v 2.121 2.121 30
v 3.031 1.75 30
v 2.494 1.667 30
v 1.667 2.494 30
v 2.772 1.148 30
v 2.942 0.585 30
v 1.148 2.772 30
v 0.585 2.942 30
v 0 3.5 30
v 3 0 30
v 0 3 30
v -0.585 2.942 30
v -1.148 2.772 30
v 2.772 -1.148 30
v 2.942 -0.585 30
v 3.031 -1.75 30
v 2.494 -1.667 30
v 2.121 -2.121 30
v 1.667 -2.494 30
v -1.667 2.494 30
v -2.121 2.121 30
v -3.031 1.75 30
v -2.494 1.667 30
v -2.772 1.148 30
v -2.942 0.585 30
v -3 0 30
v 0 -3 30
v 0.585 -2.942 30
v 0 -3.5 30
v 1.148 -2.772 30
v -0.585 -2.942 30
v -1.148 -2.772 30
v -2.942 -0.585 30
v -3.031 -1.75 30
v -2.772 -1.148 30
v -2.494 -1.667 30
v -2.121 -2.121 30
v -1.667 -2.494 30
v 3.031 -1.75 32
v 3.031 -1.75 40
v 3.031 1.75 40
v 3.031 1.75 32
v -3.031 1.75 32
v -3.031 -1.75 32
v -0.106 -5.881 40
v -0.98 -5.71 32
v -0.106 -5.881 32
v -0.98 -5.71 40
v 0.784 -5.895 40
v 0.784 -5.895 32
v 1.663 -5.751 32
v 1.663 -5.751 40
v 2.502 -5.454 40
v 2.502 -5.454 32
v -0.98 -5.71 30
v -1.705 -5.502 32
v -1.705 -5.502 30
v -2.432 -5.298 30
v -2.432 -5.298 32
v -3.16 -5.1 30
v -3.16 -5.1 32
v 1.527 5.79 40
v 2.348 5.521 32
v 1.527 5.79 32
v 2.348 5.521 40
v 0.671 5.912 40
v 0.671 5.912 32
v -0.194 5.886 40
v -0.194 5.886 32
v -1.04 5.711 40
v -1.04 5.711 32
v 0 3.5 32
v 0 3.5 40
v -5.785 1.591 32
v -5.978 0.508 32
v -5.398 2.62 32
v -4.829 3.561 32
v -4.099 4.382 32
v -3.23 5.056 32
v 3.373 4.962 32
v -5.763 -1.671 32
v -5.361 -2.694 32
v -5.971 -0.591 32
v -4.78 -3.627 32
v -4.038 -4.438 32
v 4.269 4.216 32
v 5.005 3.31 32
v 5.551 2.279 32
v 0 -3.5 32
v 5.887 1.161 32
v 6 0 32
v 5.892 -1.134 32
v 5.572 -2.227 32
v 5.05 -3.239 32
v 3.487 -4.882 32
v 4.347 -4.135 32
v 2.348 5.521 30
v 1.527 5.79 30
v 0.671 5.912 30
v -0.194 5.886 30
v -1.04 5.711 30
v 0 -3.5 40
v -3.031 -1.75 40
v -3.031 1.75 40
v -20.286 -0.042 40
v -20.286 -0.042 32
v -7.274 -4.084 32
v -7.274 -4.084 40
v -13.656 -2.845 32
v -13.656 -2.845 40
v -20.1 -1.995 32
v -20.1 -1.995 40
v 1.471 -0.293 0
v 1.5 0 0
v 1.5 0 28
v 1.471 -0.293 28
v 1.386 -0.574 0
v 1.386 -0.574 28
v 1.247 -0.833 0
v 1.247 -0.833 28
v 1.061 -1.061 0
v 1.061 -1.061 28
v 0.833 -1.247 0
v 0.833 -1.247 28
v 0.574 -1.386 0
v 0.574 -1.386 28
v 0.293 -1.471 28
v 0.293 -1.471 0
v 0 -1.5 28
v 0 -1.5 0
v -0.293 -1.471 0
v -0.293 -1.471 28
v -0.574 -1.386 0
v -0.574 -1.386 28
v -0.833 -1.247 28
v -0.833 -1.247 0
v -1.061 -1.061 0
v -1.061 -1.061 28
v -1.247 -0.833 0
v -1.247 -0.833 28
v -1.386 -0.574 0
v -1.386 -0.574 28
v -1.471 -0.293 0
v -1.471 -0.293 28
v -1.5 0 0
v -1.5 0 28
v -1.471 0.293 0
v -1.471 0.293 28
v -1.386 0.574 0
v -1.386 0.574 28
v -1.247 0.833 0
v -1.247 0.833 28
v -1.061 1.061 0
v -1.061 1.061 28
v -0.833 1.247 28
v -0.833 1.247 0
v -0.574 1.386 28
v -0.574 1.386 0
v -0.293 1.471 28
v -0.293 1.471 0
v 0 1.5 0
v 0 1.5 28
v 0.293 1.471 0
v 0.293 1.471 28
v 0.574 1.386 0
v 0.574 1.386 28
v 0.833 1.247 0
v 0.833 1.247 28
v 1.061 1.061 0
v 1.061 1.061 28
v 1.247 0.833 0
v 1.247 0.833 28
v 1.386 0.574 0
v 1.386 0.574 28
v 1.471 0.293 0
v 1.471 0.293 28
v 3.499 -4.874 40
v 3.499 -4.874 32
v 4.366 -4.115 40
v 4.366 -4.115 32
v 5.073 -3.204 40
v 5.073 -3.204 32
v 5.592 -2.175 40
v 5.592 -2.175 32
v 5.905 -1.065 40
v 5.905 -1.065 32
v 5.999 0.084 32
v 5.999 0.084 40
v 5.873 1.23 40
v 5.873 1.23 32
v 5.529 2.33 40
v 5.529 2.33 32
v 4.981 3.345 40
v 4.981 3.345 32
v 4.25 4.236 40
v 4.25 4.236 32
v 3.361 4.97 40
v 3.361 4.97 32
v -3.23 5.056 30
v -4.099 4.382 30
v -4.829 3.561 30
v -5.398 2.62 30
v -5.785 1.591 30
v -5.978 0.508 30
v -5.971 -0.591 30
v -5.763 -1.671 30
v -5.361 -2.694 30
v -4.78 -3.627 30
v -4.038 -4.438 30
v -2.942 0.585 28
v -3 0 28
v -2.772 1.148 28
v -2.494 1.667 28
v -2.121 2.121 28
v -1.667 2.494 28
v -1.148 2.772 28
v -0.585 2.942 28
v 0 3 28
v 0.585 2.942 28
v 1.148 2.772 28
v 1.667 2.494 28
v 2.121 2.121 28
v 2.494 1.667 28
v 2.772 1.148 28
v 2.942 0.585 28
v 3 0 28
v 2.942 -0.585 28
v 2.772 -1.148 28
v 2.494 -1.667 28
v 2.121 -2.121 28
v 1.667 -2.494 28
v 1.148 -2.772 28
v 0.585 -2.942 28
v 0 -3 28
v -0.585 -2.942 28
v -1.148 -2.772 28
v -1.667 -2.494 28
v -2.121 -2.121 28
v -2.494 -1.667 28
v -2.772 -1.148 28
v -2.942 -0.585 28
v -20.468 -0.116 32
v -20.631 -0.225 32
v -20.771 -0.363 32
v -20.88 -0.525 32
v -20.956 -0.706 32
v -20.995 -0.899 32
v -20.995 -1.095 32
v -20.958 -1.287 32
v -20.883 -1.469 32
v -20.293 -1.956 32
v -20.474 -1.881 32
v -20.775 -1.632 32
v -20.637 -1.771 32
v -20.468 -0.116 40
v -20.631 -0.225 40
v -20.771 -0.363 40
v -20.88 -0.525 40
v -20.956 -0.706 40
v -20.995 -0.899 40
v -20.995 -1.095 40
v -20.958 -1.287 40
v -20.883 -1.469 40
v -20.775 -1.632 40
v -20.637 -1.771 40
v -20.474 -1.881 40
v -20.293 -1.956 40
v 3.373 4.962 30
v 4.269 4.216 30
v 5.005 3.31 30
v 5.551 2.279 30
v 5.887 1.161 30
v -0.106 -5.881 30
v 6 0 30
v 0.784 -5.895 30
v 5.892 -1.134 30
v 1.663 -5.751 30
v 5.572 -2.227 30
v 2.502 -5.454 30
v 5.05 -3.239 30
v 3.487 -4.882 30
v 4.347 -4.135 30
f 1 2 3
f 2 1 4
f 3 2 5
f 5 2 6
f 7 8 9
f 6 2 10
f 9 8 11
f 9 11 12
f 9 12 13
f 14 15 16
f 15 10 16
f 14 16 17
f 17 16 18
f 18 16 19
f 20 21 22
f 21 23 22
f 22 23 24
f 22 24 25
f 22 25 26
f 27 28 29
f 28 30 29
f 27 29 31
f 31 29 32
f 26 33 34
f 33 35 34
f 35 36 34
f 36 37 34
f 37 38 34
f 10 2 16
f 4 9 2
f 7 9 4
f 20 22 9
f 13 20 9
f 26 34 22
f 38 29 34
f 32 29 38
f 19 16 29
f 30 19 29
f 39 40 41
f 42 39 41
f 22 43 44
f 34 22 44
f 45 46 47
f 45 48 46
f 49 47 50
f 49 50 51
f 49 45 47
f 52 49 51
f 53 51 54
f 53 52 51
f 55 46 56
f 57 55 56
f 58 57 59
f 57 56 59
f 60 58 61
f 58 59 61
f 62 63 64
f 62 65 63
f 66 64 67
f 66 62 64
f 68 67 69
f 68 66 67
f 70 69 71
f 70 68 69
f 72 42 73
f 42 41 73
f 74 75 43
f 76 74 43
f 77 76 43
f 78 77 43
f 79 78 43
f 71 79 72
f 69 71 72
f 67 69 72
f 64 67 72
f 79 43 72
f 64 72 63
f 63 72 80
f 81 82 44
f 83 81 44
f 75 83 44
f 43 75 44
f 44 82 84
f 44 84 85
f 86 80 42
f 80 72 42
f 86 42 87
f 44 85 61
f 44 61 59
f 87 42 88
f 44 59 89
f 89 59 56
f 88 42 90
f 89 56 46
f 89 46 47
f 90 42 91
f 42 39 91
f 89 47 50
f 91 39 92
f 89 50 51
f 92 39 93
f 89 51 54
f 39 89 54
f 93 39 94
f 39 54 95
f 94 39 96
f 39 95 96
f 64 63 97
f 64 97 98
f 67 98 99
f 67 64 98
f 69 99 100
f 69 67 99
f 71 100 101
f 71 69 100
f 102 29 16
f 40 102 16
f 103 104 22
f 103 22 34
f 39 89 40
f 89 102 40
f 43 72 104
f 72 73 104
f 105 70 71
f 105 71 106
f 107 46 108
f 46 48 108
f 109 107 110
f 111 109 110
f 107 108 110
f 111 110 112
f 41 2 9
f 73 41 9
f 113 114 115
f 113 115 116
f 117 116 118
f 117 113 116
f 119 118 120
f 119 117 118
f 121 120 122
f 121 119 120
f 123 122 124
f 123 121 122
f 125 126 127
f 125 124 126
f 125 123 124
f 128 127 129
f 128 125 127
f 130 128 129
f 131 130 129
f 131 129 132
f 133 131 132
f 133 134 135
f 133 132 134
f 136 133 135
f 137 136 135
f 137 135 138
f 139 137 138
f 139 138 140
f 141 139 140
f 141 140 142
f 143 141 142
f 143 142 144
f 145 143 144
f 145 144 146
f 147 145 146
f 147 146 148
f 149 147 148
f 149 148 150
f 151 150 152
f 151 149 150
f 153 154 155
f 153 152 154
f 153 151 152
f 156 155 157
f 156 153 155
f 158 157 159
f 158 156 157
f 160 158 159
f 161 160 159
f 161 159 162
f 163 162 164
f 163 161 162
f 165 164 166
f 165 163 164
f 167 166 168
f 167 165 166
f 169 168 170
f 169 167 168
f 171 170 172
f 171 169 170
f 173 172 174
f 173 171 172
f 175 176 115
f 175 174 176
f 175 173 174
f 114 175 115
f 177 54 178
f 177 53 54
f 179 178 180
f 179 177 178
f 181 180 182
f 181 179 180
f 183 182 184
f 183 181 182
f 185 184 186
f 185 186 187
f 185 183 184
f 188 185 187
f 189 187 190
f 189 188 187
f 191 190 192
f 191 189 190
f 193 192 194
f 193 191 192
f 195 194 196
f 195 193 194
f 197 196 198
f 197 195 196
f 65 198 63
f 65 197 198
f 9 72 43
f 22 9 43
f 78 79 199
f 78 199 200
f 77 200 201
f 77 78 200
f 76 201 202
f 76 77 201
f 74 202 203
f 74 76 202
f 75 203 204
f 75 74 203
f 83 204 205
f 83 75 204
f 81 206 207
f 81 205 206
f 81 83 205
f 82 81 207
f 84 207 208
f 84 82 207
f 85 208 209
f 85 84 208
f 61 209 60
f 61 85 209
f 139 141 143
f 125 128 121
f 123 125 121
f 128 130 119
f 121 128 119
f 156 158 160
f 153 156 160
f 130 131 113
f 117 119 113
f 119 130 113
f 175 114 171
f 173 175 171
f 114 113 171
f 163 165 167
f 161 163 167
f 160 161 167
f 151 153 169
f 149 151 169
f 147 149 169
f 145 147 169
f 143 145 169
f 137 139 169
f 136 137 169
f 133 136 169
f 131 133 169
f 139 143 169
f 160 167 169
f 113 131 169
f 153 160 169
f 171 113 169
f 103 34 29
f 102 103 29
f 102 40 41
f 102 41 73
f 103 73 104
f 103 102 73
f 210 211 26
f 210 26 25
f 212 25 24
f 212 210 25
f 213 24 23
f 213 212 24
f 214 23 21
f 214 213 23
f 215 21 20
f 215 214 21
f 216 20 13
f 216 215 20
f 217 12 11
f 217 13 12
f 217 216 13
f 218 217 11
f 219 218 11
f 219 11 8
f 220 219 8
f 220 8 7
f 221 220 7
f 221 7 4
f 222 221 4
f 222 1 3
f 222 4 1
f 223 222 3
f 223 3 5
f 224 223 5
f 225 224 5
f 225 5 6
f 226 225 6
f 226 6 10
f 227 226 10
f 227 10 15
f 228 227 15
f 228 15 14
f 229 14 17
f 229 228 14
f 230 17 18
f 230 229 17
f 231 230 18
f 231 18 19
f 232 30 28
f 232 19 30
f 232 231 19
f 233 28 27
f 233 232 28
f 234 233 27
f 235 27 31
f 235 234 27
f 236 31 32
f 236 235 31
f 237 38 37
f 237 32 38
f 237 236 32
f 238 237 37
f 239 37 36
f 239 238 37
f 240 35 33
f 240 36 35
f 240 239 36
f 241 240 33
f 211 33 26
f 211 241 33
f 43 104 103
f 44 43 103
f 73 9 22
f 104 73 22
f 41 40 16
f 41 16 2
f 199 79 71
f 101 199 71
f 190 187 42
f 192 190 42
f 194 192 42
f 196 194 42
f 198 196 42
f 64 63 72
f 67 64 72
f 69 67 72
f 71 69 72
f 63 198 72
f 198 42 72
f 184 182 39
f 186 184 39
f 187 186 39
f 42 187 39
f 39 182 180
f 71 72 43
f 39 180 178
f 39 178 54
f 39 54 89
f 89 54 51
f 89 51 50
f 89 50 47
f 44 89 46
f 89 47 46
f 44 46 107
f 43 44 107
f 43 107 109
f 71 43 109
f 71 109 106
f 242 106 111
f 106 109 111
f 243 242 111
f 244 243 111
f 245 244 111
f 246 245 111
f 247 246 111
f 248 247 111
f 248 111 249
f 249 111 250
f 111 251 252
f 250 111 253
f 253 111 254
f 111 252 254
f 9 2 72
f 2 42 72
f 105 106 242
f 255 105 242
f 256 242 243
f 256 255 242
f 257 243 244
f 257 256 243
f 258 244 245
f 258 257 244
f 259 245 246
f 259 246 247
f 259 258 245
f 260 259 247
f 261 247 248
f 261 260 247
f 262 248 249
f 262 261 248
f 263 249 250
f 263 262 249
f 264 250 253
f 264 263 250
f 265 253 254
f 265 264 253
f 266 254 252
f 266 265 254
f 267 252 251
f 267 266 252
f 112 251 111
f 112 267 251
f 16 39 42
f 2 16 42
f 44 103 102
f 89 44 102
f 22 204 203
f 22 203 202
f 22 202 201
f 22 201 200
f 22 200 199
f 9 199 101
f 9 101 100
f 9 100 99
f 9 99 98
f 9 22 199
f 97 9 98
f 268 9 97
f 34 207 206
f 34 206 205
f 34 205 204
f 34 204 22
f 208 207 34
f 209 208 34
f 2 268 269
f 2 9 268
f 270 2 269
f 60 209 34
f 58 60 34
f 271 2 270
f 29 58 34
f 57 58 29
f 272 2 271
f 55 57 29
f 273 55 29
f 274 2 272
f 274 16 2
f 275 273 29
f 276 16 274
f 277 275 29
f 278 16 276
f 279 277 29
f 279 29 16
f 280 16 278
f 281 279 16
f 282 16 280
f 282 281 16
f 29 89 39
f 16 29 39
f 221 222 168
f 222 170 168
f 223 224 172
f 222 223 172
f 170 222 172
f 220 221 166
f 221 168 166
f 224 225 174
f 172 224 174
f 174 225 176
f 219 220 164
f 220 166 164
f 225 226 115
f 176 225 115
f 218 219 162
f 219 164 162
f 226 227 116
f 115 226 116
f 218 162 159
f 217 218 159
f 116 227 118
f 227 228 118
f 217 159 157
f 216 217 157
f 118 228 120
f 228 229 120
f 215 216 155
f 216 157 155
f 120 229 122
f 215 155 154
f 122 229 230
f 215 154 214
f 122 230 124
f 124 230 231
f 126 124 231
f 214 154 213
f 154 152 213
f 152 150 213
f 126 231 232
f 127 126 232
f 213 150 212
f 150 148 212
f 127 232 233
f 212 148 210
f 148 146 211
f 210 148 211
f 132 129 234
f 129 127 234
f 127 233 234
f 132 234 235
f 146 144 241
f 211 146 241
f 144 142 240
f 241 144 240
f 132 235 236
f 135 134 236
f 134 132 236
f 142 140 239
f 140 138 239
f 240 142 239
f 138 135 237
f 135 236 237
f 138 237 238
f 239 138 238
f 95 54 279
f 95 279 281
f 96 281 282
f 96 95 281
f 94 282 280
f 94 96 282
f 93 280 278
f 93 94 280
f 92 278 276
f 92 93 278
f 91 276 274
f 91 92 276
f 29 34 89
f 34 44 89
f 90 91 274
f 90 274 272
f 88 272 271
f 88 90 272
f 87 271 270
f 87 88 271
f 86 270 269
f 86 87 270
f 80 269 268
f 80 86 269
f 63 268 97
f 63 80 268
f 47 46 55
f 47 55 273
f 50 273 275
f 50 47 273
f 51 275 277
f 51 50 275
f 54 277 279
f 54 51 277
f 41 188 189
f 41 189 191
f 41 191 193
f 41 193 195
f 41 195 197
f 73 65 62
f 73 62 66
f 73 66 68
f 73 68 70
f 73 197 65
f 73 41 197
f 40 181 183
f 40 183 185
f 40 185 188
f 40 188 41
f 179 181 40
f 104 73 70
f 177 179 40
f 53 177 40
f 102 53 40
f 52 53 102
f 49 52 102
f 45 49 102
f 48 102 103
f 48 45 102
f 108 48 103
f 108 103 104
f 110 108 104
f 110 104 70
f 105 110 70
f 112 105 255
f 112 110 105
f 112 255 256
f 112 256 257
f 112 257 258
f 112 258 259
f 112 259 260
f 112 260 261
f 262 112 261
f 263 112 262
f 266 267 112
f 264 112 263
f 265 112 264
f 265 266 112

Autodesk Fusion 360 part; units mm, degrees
sketch "Sketch1" plane through (0, 0, 0) normal (0, 0, 1) x (1, 0, 0)
  circle A0 centre (0, 0) radius 1.5
  dimension "d1" = 3
extrude "Extrude1" add sketch "Sketch1" along normal blind 28 makes body 1
sketch "Sketch2" plane through (0, 0, 28) normal (0, 0, 1) x (-1, 0, 0)
  circle A0 centre (0, 0) radius 1.5
  circle A1 centre (0, 0) radius 3
  dimension "d4" = 6
extrude "Extrude2" add sketch "Sketch2" along normal blind 2 contours A0 | A1 bodies 1
sketch "Sketch3" plane through (0, 0, 30) normal (0, 0, 1) x (-1, 0, 0)
  circle A0 centre (0, 0) radius 3
  line L0 (0, -3.5) -> (3.0311, -1.75)
  line L1 (3.0311, -1.75) -> (3.0311, 1.75)
  line L2 (3.0311, 1.75) -> (0, 3.5)
  line L3 (0, 3.5) -> (-3.0311, 1.75)
  line L4 (-3.0311, 1.75) -> (-3.0311, -1.75)
  line L5 (-3.0311, -1.75) -> (0, -3.5)
  dimension "d7" = 3.5
extrude "Extrude3" add sketch "Sketch3" along normal blind 10 contours A0 | L0 L1 L2 L3 L4 L5 bodies 1
sketch "Sketch4" plane through (0, 0, 40) normal (0, 0, 1) x (-1, 0, 0)
  line L0 (-3.0311, -1.75) -> (0, -3.5)
  line L1 (0, -3.5) -> (3.0311, -1.75)
  line L2 (3.0311, -1.75) -> (3.0311, 1.75)
  line L3 (3.0311, 1.75) -> (0, 3.5)
  line L4 (0, 3.5) -> (-3.0311, 1.75)
  line L5 (-3.0311, 1.75) -> (-3.0311, -1.75)
  line L6 (1.0405, -5.7108) -> (20.2864, 0.0419)
  arc A0 (0.9798, 5.7098) -> (20.1005, 1.9949) centre (30.843, 108.3515) ccw
  arc A1 (20.2864, 0.0419) -> (20.1005, 1.9949) centre (20, 1) ccw
  arc A2 (-2.502, 5.4535) -> (-2.3485, -5.5213) centre (0, 0) ccw
  arc A3 (-2.3485, -5.5213) -> (1.0405, -5.7108) centre (-0.3914, -0.9202) ccw
  arc A4 (0.9798, 5.7098) -> (-2.502, 5.4535) centre (-0.417, 0.9089) ccw
  dimension "d10" = 12
  dimension "d12" = 1
  dimension "d13" = 20
  dimension "d14" = 5
  dimension "d20" = 5
  dimension "d21" = 106.8978
  dimension "d22" = 0.8298
  dimension "d23" = 2.6141
  dimension "d24" = 33.8741
extrude "Extrude4" add sketch "Sketch4" against normal blind 8 separate body makes body 2
sketch "Sketch5" plane through (0, 0, 32) normal (0, 0, -1) x (1, 0, 0)
  line L0 (3.0311, 1.75) -> (3.0311, -1.75)
  line L1 (3.0311, -1.75) -> (0, -3.5)
  line L2 (0, -3.5) -> (-3.0311, -1.75)
  line L3 (-3.0311, -1.75) -> (-3.0311, 1.75)
  line L4 (-3.0311, 1.75) -> (0, 3.5)
  line L5 (0, 3.5) -> (3.0311, 1.75)
  arc A0 (2.3485, -5.5213) -> (2.502, 5.4535) centre (0, 0) ccw
  arc A1 (-20.1005, 1.9949) -> (-0.9798, 5.7098) centre (-30.843, 108.3515) ccw
  arc A2 (-20.1005, 1.9949) -> (-20.2864, 0.0419) centre (-20, 1) ccw
  line L6 (-20.2864, 0.0419) -> (-1.0405, -5.7108)
  arc A3 (-1.0405, -5.7108) -> (2.3485, -5.5213) centre (0.3914, -0.9202) ccw
  circle A4 centre (0, 0) radius 6
  arc A5 (2.502, 5.4535) -> (-0.9798, 5.7098) centre (0.417, 0.9089) ccw
  dimension "d17" = 12
extrude "Extrude5" add sketch "Sketch5" along normal blind 2 separate body contours A0 A1 L6 A3 A4 A5 makes body 3
equation "d2 = ( 55 / 2 ) * 1 mm + 0.5 mm"
